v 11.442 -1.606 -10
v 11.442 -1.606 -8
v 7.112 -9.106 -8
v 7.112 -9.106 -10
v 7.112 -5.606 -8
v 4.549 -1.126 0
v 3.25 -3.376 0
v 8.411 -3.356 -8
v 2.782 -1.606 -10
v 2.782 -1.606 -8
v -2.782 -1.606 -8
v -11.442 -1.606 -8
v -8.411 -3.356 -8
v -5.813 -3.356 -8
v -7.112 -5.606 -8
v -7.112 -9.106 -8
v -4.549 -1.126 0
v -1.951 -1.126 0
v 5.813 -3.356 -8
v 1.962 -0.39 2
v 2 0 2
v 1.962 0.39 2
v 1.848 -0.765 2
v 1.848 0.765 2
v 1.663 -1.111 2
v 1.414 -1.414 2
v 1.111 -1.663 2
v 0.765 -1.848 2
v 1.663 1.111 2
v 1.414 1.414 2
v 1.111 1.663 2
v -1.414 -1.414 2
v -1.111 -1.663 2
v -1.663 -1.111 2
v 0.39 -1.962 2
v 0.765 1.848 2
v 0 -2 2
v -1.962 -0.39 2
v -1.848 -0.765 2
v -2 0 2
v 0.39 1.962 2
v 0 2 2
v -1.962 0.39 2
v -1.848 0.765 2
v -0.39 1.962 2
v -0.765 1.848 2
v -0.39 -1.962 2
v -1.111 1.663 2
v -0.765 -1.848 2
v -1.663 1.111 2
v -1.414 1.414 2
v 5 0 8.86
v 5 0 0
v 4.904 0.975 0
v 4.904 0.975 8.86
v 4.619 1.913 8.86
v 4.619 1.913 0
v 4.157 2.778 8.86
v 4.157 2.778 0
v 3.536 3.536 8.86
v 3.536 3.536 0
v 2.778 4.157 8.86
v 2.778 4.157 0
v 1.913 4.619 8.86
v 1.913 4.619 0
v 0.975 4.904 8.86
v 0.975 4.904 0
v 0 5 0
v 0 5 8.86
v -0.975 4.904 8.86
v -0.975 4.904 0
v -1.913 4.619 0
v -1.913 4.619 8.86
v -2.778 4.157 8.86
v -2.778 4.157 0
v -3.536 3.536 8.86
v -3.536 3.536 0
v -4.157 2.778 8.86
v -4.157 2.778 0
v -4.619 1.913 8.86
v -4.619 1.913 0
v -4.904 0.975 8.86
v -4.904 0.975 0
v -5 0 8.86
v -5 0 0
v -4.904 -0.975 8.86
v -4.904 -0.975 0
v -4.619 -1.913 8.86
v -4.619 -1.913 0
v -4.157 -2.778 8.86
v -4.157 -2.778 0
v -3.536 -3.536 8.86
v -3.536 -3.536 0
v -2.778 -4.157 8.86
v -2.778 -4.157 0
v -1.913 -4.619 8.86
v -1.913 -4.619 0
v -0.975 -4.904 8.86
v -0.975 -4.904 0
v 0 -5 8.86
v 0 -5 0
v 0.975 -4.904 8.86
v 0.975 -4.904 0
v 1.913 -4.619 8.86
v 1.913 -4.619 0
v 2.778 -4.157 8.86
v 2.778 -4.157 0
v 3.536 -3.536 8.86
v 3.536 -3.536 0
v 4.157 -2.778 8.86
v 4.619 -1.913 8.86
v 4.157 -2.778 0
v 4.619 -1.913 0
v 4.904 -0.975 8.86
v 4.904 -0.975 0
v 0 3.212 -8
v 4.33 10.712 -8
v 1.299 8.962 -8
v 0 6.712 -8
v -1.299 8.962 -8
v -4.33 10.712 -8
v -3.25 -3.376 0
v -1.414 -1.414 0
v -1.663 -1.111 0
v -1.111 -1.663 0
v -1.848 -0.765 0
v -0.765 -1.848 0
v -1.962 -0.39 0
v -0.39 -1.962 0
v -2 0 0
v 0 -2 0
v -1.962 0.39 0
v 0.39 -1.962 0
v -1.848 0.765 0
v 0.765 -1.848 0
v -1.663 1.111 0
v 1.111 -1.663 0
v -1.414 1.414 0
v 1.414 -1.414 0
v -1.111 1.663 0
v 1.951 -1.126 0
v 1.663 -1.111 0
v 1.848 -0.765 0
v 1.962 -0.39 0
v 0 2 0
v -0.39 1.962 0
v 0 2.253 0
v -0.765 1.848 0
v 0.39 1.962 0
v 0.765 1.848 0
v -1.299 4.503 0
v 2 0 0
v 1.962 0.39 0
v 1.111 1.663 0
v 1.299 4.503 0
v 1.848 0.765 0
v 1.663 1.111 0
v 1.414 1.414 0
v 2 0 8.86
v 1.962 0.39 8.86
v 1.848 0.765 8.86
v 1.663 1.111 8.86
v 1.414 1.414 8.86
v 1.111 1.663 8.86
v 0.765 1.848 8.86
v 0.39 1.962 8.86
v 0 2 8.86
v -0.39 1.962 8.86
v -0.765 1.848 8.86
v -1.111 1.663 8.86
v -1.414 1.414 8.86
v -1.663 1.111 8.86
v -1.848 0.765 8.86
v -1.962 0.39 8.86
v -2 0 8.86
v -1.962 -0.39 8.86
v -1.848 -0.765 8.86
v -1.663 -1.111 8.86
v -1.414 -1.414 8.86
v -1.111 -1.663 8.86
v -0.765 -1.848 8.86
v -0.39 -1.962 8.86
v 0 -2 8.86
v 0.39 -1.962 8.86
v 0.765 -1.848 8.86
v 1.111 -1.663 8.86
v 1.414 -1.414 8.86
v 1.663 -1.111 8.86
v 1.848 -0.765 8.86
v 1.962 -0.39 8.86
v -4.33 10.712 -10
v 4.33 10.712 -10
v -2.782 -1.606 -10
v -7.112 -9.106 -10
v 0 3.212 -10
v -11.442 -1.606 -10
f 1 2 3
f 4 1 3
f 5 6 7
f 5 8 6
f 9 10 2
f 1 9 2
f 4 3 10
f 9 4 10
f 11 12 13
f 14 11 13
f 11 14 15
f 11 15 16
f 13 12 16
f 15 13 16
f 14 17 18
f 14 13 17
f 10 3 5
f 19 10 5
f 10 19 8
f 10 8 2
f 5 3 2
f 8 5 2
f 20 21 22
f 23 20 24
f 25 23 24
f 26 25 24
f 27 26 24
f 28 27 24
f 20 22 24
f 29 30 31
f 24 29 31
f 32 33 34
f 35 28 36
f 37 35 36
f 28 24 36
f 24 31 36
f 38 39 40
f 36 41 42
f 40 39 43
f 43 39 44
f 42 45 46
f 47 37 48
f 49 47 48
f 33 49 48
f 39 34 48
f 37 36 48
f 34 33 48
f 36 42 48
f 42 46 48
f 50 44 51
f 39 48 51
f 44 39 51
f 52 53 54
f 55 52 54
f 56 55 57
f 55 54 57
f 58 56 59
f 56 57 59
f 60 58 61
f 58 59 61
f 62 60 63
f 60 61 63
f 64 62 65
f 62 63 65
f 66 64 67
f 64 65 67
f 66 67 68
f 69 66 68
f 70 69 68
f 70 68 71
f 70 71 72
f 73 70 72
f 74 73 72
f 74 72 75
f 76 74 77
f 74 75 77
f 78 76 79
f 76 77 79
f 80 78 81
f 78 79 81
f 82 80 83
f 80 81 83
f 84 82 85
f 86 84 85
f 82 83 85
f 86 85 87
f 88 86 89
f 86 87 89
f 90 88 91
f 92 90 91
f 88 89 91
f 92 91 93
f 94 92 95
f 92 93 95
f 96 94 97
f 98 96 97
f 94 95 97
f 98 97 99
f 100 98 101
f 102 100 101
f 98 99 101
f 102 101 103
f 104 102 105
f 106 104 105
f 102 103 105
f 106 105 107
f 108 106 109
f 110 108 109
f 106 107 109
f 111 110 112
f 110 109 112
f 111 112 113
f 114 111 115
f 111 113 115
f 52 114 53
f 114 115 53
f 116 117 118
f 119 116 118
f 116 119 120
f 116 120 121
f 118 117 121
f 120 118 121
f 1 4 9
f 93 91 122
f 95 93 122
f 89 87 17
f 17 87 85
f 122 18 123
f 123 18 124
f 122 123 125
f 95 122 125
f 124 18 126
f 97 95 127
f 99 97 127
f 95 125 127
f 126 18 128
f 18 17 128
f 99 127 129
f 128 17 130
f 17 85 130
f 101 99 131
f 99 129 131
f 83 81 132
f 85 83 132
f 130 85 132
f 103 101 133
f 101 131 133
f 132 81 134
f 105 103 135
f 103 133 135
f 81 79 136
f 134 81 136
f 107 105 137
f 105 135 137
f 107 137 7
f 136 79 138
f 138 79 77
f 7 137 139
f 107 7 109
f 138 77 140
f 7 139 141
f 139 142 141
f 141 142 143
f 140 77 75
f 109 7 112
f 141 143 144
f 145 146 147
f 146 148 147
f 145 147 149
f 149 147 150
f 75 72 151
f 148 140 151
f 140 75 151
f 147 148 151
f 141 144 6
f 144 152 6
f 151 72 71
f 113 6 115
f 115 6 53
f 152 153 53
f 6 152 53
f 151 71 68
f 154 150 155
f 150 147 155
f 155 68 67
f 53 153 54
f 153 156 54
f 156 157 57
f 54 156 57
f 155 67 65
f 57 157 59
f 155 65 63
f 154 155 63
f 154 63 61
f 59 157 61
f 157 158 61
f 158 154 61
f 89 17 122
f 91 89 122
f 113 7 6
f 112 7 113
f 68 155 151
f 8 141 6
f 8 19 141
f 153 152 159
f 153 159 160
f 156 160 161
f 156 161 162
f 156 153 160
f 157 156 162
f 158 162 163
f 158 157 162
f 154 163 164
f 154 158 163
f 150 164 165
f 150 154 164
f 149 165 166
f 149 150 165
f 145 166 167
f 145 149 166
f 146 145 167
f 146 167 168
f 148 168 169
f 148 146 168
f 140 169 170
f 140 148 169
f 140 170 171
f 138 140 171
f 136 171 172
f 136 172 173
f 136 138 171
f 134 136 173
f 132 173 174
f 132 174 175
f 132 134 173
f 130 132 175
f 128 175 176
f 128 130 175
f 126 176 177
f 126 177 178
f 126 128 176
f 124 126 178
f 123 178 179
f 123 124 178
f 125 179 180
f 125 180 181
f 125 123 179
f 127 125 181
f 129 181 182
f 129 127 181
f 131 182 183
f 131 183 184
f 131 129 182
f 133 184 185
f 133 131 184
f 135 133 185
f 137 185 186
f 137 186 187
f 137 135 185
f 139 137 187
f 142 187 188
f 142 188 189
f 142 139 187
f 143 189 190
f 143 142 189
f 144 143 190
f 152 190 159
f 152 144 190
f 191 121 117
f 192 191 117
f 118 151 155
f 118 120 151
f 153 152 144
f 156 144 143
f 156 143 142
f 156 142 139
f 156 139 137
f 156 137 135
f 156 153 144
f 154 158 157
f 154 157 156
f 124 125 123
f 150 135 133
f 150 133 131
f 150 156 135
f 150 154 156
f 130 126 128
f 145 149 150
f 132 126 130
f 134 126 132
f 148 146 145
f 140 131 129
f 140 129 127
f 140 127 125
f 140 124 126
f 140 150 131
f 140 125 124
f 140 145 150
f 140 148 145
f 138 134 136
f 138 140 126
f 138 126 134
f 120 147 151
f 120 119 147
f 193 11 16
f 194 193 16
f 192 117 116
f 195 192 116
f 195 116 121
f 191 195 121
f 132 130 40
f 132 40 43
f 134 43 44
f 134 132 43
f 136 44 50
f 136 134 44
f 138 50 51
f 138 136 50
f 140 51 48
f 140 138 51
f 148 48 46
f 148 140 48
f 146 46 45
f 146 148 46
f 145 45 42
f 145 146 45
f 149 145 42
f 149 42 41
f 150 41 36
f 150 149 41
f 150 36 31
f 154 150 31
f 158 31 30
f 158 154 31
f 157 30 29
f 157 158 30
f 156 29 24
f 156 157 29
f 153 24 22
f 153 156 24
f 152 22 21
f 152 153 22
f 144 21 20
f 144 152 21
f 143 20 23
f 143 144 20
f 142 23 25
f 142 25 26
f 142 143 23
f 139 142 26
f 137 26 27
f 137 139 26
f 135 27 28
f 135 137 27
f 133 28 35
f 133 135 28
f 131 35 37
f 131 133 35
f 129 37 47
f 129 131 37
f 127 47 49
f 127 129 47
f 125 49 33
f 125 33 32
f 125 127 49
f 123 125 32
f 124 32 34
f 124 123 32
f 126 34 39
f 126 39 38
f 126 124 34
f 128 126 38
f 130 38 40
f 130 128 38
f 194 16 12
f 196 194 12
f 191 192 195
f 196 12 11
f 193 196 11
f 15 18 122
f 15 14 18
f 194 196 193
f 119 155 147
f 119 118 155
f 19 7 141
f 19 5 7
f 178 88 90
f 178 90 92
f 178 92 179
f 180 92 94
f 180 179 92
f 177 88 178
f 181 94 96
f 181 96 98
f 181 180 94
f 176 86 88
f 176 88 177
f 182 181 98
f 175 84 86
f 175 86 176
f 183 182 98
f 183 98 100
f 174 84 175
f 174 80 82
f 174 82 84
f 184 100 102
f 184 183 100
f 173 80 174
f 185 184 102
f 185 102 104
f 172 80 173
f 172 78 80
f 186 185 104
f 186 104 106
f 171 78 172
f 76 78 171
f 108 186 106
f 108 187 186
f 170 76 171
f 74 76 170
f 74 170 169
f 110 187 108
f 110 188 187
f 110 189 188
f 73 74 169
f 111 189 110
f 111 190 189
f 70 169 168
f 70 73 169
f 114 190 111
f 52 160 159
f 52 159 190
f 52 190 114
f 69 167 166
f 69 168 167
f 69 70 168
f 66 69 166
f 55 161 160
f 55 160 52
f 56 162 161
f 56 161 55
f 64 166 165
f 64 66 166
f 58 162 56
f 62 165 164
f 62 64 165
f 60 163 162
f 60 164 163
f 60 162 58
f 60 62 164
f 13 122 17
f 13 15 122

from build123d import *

# Parameters (mm, degrees)
SKETCH_1_R               = 5
SKETCH_1_R_2             = 2
EXTRUDE_1_DEPTH          = 8.86
PATTERN_CIRCULAR_1_COUNT = 3
EXTRUDE_2_DEPTH          = 2
PATTERN_CIRCULAR_2_COUNT = 3
SKETCH_5_R               = 2
EXTRUDE_3_DEPTH          = 2


with BuildPart() as part:
    # 草图1 → 凸台-拉伸1 (new body)
    with BuildSketch(Plane.XY):
        Circle(SKETCH_1_R)
        Circle(SKETCH_1_R_2, mode=Mode.SUBTRACT)
    extrude(amount=EXTRUDE_1_DEPTH)

    # 草图3 → 放样1 section 0
    with BuildSketch(Plane(origin=(0, 0, 0), x_dir=(-1, 0, 0), z_dir=(0, 0, -1))):
        with BuildLine():
            Line((0, 2.25277675), (1.299038106, 4.50277675))
            Line((1.299038106, 4.50277675), (-1.299038106, 4.50277675))
            Line((-1.299038106, 4.50277675), (0, 2.25277675))
        make_face()
    # 草图2 → 放样1 section 1
    with BuildSketch(Plane.XY.offset(-8)):
        with BuildLine():
            Line((0, 6.712322525), (1.299038106, 8.962322525))
            Line((1.299038106, 8.962322525), (-1.299038106, 8.962322525))
            Line((-1.299038106, 8.962322525), (0, 6.712322525))
        make_face()
    loft_1 = loft()

    # 阵列(圆周)1: 放样1 ×3 about axis
    pattern_circular_1_axis = Axis((0, 0, 0), (0, 0, 1))
    for i in range(1, PATTERN_CIRCULAR_1_COUNT):
        add(loft_1.rotate(pattern_circular_1_axis, i * 360 / PATTERN_CIRCULAR_1_COUNT))

    # 草图4 → 凸台-拉伸2 (add)
    with BuildSketch(Plane(origin=(0, 0, -8), x_dir=(-1, 0, 0), z_dir=(0, 0, -1))):
        Polygon((0, 3.212322525), (4.330127019, 10.712322525), (-4.330127019, 10.712322525), align=None)
    extrude_2 = extrude(amount=EXTRUDE_2_DEPTH)

    # 阵列(圆周)2: 凸台-拉伸2 ×3 about axis
    pattern_circular_2_axis = Axis((0, 0, 0), (0, 0, 1))
    for i in range(1, PATTERN_CIRCULAR_2_COUNT):
        add(extrude_2.rotate(pattern_circular_2_axis, i * 360 / PATTERN_CIRCULAR_2_COUNT))


with BuildPart() as body_2:
    # 草图5 → 凸台-拉伸3 (new body)
    with BuildSketch(Plane(origin=(0, 0, 0), x_dir=(-1, 0, 0), z_dir=(0, 0, -1))):
        Circle(SKETCH_5_R)
    extrude(amount=-EXTRUDE_3_DEPTH)


solid = Compound([part.part, body_2.part])
